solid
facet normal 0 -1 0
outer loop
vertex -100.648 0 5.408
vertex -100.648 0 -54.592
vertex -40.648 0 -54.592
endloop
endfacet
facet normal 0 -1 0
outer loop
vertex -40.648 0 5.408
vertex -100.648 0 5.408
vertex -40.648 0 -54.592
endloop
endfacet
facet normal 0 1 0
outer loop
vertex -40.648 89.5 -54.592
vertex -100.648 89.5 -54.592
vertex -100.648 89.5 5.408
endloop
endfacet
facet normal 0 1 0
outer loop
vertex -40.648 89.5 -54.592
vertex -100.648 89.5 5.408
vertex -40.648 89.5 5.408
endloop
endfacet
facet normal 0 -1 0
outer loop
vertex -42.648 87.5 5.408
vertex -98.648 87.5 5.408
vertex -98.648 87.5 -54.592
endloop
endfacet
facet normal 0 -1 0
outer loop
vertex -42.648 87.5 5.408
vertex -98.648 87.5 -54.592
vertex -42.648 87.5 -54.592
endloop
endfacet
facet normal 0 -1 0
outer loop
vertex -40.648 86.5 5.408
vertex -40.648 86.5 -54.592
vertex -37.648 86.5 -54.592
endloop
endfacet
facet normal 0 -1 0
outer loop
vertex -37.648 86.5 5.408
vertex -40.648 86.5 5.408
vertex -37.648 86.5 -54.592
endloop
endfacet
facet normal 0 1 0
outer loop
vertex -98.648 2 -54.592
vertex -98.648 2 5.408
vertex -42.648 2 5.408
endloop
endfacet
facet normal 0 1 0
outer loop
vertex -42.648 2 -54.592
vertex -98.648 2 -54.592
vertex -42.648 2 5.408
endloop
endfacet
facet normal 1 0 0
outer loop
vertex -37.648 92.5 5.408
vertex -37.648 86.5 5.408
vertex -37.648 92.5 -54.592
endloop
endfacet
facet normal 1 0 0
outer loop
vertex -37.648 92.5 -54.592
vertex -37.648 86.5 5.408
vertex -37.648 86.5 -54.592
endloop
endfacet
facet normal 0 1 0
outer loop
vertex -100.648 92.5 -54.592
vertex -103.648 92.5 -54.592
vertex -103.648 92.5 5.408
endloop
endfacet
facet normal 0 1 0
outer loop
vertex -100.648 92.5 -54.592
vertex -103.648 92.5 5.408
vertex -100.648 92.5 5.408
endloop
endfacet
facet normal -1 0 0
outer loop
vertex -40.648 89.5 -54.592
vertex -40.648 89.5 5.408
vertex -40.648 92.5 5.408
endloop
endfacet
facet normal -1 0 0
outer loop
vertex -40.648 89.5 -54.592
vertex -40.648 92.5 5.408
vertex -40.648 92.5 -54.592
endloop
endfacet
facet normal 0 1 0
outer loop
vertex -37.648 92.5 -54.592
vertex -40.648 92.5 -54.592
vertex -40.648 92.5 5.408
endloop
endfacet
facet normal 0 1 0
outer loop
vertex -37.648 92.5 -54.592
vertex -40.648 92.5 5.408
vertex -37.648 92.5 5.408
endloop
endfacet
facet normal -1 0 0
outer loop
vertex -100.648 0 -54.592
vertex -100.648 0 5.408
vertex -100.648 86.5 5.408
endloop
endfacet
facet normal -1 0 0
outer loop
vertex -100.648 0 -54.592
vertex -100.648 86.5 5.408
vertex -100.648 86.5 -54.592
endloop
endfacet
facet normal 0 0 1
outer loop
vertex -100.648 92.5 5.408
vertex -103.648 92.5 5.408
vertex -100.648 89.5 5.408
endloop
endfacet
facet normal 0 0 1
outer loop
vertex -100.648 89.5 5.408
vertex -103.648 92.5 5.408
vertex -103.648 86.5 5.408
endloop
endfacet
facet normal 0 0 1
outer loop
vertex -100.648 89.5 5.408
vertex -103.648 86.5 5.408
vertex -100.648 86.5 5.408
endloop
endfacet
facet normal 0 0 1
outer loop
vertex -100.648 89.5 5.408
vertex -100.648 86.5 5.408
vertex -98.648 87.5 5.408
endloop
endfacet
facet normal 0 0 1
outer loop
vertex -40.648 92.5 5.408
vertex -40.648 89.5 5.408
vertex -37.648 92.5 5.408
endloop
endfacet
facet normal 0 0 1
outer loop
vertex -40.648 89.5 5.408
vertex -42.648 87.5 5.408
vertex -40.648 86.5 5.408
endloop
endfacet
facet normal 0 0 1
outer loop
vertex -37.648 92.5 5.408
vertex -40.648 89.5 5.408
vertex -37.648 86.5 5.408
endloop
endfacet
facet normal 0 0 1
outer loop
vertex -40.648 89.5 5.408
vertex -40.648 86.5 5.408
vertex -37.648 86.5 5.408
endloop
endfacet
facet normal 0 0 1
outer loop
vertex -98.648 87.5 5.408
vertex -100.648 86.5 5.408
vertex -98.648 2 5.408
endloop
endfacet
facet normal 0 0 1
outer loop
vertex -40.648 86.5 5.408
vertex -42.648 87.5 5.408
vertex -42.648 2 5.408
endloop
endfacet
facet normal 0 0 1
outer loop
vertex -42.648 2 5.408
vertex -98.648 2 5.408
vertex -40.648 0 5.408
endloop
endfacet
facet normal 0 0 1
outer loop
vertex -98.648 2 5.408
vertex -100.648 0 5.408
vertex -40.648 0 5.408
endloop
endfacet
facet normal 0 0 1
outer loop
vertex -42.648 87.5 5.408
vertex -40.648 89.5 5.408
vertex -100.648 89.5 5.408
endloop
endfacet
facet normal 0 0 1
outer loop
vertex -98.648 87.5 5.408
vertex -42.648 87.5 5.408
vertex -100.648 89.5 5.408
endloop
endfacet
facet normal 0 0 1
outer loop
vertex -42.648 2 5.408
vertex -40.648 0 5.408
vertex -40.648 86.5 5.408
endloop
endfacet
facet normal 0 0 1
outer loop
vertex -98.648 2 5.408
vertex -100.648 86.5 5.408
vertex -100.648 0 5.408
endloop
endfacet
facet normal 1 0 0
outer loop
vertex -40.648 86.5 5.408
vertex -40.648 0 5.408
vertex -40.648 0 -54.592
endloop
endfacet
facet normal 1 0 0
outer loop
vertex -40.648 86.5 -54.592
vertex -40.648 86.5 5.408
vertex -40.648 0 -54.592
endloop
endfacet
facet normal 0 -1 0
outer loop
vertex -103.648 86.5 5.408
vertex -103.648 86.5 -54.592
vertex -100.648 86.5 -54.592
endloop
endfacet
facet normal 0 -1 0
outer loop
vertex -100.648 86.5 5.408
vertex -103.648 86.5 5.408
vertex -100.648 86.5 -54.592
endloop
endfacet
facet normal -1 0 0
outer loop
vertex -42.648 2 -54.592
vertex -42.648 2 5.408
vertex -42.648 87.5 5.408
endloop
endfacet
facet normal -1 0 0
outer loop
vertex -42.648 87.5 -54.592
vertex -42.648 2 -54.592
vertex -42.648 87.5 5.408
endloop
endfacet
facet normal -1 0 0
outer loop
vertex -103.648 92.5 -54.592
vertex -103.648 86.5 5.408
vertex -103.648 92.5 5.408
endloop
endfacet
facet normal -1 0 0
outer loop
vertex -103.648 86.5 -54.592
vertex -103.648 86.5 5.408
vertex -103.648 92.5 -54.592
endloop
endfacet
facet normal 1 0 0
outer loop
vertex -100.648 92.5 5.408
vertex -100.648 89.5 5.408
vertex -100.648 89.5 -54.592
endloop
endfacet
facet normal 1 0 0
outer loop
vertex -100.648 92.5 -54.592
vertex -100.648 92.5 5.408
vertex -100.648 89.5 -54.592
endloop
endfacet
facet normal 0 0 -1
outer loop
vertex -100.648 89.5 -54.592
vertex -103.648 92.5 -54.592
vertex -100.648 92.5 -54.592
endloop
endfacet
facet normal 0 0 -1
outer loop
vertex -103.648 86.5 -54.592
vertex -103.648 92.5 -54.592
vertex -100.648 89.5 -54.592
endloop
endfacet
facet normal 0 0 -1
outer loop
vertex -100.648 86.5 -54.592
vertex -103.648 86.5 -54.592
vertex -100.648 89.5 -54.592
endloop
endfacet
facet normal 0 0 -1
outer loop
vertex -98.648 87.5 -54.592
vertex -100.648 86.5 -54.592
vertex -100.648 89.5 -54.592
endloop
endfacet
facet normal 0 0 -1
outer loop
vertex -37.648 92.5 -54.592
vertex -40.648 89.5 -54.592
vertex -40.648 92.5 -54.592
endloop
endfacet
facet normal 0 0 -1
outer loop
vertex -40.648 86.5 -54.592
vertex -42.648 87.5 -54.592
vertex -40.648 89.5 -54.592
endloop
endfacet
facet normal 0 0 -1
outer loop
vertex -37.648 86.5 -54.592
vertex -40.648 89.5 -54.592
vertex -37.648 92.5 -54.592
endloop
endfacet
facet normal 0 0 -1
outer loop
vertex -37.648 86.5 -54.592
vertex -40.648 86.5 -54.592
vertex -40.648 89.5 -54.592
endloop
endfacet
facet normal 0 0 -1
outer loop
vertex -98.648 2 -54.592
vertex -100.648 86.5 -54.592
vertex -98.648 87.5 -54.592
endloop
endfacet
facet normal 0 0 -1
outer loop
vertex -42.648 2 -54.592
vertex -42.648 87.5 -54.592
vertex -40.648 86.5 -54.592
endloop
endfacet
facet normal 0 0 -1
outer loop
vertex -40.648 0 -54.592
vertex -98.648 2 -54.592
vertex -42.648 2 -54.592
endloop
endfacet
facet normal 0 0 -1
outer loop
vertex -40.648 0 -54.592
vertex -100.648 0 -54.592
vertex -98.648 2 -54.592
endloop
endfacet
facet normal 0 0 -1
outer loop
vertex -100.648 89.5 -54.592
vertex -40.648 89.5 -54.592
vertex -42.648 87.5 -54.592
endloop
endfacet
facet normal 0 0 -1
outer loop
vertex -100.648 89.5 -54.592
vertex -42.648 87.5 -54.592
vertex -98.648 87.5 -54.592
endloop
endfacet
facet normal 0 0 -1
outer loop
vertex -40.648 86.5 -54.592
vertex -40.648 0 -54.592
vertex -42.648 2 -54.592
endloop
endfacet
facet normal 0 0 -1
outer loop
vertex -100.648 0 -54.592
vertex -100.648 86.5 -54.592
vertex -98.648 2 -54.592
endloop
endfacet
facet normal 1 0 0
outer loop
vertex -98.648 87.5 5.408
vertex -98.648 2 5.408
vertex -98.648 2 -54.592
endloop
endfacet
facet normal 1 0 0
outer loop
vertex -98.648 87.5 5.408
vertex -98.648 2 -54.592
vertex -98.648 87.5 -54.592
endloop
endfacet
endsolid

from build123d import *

# Parameters (mm, degrees)
SKETCH2_W                = 60
SKETCH2_H                = 60
BOSS_EXTRUDE1_DEPTH      = 89.5
SKETCH3_W                = 56
SKETCH3_H                = 85.5
CUT_EXTRUDE1_DEPTH       = 60
BOSS_EXTRUDE2_DEPTH      = 3
BOSS_EXTRUDE2_DEPTH_BACK = 3
SKETCH4_W                = 3
SKETCH4_H                = 60


with BuildPart() as part:
    # Sketch2 → Boss-Extrude1 (new body)
    with BuildSketch(Plane(origin=(0, 0, 0), x_dir=(1, 0, 0), z_dir=(0, 1, 0))):
        with Locations((-70.647761504, 24.591630357)):
            Rectangle(SKETCH2_W, SKETCH2_H)
    extrude(amount=BOSS_EXTRUDE1_DEPTH)

    # Sketch3 → Cut-Extrude1 (cut)
    with BuildSketch(Plane.XY.offset(5.408369643)):
        with Locations((-70.647761504, 44.75)):
            Rectangle(SKETCH3_W, SKETCH3_H)
    extrude(amount=-CUT_EXTRUDE1_DEPTH, mode=Mode.SUBTRACT)

    # Sketch4 → Boss-Extrude2 (add, two sides: drawn at the far end of the back side and taken through both)
    with BuildSketch(Plane(origin=(0, 89.5, 0), x_dir=(1, 0, 0), z_dir=(0, 1, 0)).offset(-BOSS_EXTRUDE2_DEPTH_BACK)):
        with Locations((-102.147761504, 24.591630357)):
            Rectangle(SKETCH4_W, SKETCH4_H)
        with Locations((-39.147761504, 24.591630357)):
            Rectangle(SKETCH4_W, SKETCH4_H)
    extrude(amount=BOSS_EXTRUDE2_DEPTH + BOSS_EXTRUDE2_DEPTH_BACK)


solid = part.part
